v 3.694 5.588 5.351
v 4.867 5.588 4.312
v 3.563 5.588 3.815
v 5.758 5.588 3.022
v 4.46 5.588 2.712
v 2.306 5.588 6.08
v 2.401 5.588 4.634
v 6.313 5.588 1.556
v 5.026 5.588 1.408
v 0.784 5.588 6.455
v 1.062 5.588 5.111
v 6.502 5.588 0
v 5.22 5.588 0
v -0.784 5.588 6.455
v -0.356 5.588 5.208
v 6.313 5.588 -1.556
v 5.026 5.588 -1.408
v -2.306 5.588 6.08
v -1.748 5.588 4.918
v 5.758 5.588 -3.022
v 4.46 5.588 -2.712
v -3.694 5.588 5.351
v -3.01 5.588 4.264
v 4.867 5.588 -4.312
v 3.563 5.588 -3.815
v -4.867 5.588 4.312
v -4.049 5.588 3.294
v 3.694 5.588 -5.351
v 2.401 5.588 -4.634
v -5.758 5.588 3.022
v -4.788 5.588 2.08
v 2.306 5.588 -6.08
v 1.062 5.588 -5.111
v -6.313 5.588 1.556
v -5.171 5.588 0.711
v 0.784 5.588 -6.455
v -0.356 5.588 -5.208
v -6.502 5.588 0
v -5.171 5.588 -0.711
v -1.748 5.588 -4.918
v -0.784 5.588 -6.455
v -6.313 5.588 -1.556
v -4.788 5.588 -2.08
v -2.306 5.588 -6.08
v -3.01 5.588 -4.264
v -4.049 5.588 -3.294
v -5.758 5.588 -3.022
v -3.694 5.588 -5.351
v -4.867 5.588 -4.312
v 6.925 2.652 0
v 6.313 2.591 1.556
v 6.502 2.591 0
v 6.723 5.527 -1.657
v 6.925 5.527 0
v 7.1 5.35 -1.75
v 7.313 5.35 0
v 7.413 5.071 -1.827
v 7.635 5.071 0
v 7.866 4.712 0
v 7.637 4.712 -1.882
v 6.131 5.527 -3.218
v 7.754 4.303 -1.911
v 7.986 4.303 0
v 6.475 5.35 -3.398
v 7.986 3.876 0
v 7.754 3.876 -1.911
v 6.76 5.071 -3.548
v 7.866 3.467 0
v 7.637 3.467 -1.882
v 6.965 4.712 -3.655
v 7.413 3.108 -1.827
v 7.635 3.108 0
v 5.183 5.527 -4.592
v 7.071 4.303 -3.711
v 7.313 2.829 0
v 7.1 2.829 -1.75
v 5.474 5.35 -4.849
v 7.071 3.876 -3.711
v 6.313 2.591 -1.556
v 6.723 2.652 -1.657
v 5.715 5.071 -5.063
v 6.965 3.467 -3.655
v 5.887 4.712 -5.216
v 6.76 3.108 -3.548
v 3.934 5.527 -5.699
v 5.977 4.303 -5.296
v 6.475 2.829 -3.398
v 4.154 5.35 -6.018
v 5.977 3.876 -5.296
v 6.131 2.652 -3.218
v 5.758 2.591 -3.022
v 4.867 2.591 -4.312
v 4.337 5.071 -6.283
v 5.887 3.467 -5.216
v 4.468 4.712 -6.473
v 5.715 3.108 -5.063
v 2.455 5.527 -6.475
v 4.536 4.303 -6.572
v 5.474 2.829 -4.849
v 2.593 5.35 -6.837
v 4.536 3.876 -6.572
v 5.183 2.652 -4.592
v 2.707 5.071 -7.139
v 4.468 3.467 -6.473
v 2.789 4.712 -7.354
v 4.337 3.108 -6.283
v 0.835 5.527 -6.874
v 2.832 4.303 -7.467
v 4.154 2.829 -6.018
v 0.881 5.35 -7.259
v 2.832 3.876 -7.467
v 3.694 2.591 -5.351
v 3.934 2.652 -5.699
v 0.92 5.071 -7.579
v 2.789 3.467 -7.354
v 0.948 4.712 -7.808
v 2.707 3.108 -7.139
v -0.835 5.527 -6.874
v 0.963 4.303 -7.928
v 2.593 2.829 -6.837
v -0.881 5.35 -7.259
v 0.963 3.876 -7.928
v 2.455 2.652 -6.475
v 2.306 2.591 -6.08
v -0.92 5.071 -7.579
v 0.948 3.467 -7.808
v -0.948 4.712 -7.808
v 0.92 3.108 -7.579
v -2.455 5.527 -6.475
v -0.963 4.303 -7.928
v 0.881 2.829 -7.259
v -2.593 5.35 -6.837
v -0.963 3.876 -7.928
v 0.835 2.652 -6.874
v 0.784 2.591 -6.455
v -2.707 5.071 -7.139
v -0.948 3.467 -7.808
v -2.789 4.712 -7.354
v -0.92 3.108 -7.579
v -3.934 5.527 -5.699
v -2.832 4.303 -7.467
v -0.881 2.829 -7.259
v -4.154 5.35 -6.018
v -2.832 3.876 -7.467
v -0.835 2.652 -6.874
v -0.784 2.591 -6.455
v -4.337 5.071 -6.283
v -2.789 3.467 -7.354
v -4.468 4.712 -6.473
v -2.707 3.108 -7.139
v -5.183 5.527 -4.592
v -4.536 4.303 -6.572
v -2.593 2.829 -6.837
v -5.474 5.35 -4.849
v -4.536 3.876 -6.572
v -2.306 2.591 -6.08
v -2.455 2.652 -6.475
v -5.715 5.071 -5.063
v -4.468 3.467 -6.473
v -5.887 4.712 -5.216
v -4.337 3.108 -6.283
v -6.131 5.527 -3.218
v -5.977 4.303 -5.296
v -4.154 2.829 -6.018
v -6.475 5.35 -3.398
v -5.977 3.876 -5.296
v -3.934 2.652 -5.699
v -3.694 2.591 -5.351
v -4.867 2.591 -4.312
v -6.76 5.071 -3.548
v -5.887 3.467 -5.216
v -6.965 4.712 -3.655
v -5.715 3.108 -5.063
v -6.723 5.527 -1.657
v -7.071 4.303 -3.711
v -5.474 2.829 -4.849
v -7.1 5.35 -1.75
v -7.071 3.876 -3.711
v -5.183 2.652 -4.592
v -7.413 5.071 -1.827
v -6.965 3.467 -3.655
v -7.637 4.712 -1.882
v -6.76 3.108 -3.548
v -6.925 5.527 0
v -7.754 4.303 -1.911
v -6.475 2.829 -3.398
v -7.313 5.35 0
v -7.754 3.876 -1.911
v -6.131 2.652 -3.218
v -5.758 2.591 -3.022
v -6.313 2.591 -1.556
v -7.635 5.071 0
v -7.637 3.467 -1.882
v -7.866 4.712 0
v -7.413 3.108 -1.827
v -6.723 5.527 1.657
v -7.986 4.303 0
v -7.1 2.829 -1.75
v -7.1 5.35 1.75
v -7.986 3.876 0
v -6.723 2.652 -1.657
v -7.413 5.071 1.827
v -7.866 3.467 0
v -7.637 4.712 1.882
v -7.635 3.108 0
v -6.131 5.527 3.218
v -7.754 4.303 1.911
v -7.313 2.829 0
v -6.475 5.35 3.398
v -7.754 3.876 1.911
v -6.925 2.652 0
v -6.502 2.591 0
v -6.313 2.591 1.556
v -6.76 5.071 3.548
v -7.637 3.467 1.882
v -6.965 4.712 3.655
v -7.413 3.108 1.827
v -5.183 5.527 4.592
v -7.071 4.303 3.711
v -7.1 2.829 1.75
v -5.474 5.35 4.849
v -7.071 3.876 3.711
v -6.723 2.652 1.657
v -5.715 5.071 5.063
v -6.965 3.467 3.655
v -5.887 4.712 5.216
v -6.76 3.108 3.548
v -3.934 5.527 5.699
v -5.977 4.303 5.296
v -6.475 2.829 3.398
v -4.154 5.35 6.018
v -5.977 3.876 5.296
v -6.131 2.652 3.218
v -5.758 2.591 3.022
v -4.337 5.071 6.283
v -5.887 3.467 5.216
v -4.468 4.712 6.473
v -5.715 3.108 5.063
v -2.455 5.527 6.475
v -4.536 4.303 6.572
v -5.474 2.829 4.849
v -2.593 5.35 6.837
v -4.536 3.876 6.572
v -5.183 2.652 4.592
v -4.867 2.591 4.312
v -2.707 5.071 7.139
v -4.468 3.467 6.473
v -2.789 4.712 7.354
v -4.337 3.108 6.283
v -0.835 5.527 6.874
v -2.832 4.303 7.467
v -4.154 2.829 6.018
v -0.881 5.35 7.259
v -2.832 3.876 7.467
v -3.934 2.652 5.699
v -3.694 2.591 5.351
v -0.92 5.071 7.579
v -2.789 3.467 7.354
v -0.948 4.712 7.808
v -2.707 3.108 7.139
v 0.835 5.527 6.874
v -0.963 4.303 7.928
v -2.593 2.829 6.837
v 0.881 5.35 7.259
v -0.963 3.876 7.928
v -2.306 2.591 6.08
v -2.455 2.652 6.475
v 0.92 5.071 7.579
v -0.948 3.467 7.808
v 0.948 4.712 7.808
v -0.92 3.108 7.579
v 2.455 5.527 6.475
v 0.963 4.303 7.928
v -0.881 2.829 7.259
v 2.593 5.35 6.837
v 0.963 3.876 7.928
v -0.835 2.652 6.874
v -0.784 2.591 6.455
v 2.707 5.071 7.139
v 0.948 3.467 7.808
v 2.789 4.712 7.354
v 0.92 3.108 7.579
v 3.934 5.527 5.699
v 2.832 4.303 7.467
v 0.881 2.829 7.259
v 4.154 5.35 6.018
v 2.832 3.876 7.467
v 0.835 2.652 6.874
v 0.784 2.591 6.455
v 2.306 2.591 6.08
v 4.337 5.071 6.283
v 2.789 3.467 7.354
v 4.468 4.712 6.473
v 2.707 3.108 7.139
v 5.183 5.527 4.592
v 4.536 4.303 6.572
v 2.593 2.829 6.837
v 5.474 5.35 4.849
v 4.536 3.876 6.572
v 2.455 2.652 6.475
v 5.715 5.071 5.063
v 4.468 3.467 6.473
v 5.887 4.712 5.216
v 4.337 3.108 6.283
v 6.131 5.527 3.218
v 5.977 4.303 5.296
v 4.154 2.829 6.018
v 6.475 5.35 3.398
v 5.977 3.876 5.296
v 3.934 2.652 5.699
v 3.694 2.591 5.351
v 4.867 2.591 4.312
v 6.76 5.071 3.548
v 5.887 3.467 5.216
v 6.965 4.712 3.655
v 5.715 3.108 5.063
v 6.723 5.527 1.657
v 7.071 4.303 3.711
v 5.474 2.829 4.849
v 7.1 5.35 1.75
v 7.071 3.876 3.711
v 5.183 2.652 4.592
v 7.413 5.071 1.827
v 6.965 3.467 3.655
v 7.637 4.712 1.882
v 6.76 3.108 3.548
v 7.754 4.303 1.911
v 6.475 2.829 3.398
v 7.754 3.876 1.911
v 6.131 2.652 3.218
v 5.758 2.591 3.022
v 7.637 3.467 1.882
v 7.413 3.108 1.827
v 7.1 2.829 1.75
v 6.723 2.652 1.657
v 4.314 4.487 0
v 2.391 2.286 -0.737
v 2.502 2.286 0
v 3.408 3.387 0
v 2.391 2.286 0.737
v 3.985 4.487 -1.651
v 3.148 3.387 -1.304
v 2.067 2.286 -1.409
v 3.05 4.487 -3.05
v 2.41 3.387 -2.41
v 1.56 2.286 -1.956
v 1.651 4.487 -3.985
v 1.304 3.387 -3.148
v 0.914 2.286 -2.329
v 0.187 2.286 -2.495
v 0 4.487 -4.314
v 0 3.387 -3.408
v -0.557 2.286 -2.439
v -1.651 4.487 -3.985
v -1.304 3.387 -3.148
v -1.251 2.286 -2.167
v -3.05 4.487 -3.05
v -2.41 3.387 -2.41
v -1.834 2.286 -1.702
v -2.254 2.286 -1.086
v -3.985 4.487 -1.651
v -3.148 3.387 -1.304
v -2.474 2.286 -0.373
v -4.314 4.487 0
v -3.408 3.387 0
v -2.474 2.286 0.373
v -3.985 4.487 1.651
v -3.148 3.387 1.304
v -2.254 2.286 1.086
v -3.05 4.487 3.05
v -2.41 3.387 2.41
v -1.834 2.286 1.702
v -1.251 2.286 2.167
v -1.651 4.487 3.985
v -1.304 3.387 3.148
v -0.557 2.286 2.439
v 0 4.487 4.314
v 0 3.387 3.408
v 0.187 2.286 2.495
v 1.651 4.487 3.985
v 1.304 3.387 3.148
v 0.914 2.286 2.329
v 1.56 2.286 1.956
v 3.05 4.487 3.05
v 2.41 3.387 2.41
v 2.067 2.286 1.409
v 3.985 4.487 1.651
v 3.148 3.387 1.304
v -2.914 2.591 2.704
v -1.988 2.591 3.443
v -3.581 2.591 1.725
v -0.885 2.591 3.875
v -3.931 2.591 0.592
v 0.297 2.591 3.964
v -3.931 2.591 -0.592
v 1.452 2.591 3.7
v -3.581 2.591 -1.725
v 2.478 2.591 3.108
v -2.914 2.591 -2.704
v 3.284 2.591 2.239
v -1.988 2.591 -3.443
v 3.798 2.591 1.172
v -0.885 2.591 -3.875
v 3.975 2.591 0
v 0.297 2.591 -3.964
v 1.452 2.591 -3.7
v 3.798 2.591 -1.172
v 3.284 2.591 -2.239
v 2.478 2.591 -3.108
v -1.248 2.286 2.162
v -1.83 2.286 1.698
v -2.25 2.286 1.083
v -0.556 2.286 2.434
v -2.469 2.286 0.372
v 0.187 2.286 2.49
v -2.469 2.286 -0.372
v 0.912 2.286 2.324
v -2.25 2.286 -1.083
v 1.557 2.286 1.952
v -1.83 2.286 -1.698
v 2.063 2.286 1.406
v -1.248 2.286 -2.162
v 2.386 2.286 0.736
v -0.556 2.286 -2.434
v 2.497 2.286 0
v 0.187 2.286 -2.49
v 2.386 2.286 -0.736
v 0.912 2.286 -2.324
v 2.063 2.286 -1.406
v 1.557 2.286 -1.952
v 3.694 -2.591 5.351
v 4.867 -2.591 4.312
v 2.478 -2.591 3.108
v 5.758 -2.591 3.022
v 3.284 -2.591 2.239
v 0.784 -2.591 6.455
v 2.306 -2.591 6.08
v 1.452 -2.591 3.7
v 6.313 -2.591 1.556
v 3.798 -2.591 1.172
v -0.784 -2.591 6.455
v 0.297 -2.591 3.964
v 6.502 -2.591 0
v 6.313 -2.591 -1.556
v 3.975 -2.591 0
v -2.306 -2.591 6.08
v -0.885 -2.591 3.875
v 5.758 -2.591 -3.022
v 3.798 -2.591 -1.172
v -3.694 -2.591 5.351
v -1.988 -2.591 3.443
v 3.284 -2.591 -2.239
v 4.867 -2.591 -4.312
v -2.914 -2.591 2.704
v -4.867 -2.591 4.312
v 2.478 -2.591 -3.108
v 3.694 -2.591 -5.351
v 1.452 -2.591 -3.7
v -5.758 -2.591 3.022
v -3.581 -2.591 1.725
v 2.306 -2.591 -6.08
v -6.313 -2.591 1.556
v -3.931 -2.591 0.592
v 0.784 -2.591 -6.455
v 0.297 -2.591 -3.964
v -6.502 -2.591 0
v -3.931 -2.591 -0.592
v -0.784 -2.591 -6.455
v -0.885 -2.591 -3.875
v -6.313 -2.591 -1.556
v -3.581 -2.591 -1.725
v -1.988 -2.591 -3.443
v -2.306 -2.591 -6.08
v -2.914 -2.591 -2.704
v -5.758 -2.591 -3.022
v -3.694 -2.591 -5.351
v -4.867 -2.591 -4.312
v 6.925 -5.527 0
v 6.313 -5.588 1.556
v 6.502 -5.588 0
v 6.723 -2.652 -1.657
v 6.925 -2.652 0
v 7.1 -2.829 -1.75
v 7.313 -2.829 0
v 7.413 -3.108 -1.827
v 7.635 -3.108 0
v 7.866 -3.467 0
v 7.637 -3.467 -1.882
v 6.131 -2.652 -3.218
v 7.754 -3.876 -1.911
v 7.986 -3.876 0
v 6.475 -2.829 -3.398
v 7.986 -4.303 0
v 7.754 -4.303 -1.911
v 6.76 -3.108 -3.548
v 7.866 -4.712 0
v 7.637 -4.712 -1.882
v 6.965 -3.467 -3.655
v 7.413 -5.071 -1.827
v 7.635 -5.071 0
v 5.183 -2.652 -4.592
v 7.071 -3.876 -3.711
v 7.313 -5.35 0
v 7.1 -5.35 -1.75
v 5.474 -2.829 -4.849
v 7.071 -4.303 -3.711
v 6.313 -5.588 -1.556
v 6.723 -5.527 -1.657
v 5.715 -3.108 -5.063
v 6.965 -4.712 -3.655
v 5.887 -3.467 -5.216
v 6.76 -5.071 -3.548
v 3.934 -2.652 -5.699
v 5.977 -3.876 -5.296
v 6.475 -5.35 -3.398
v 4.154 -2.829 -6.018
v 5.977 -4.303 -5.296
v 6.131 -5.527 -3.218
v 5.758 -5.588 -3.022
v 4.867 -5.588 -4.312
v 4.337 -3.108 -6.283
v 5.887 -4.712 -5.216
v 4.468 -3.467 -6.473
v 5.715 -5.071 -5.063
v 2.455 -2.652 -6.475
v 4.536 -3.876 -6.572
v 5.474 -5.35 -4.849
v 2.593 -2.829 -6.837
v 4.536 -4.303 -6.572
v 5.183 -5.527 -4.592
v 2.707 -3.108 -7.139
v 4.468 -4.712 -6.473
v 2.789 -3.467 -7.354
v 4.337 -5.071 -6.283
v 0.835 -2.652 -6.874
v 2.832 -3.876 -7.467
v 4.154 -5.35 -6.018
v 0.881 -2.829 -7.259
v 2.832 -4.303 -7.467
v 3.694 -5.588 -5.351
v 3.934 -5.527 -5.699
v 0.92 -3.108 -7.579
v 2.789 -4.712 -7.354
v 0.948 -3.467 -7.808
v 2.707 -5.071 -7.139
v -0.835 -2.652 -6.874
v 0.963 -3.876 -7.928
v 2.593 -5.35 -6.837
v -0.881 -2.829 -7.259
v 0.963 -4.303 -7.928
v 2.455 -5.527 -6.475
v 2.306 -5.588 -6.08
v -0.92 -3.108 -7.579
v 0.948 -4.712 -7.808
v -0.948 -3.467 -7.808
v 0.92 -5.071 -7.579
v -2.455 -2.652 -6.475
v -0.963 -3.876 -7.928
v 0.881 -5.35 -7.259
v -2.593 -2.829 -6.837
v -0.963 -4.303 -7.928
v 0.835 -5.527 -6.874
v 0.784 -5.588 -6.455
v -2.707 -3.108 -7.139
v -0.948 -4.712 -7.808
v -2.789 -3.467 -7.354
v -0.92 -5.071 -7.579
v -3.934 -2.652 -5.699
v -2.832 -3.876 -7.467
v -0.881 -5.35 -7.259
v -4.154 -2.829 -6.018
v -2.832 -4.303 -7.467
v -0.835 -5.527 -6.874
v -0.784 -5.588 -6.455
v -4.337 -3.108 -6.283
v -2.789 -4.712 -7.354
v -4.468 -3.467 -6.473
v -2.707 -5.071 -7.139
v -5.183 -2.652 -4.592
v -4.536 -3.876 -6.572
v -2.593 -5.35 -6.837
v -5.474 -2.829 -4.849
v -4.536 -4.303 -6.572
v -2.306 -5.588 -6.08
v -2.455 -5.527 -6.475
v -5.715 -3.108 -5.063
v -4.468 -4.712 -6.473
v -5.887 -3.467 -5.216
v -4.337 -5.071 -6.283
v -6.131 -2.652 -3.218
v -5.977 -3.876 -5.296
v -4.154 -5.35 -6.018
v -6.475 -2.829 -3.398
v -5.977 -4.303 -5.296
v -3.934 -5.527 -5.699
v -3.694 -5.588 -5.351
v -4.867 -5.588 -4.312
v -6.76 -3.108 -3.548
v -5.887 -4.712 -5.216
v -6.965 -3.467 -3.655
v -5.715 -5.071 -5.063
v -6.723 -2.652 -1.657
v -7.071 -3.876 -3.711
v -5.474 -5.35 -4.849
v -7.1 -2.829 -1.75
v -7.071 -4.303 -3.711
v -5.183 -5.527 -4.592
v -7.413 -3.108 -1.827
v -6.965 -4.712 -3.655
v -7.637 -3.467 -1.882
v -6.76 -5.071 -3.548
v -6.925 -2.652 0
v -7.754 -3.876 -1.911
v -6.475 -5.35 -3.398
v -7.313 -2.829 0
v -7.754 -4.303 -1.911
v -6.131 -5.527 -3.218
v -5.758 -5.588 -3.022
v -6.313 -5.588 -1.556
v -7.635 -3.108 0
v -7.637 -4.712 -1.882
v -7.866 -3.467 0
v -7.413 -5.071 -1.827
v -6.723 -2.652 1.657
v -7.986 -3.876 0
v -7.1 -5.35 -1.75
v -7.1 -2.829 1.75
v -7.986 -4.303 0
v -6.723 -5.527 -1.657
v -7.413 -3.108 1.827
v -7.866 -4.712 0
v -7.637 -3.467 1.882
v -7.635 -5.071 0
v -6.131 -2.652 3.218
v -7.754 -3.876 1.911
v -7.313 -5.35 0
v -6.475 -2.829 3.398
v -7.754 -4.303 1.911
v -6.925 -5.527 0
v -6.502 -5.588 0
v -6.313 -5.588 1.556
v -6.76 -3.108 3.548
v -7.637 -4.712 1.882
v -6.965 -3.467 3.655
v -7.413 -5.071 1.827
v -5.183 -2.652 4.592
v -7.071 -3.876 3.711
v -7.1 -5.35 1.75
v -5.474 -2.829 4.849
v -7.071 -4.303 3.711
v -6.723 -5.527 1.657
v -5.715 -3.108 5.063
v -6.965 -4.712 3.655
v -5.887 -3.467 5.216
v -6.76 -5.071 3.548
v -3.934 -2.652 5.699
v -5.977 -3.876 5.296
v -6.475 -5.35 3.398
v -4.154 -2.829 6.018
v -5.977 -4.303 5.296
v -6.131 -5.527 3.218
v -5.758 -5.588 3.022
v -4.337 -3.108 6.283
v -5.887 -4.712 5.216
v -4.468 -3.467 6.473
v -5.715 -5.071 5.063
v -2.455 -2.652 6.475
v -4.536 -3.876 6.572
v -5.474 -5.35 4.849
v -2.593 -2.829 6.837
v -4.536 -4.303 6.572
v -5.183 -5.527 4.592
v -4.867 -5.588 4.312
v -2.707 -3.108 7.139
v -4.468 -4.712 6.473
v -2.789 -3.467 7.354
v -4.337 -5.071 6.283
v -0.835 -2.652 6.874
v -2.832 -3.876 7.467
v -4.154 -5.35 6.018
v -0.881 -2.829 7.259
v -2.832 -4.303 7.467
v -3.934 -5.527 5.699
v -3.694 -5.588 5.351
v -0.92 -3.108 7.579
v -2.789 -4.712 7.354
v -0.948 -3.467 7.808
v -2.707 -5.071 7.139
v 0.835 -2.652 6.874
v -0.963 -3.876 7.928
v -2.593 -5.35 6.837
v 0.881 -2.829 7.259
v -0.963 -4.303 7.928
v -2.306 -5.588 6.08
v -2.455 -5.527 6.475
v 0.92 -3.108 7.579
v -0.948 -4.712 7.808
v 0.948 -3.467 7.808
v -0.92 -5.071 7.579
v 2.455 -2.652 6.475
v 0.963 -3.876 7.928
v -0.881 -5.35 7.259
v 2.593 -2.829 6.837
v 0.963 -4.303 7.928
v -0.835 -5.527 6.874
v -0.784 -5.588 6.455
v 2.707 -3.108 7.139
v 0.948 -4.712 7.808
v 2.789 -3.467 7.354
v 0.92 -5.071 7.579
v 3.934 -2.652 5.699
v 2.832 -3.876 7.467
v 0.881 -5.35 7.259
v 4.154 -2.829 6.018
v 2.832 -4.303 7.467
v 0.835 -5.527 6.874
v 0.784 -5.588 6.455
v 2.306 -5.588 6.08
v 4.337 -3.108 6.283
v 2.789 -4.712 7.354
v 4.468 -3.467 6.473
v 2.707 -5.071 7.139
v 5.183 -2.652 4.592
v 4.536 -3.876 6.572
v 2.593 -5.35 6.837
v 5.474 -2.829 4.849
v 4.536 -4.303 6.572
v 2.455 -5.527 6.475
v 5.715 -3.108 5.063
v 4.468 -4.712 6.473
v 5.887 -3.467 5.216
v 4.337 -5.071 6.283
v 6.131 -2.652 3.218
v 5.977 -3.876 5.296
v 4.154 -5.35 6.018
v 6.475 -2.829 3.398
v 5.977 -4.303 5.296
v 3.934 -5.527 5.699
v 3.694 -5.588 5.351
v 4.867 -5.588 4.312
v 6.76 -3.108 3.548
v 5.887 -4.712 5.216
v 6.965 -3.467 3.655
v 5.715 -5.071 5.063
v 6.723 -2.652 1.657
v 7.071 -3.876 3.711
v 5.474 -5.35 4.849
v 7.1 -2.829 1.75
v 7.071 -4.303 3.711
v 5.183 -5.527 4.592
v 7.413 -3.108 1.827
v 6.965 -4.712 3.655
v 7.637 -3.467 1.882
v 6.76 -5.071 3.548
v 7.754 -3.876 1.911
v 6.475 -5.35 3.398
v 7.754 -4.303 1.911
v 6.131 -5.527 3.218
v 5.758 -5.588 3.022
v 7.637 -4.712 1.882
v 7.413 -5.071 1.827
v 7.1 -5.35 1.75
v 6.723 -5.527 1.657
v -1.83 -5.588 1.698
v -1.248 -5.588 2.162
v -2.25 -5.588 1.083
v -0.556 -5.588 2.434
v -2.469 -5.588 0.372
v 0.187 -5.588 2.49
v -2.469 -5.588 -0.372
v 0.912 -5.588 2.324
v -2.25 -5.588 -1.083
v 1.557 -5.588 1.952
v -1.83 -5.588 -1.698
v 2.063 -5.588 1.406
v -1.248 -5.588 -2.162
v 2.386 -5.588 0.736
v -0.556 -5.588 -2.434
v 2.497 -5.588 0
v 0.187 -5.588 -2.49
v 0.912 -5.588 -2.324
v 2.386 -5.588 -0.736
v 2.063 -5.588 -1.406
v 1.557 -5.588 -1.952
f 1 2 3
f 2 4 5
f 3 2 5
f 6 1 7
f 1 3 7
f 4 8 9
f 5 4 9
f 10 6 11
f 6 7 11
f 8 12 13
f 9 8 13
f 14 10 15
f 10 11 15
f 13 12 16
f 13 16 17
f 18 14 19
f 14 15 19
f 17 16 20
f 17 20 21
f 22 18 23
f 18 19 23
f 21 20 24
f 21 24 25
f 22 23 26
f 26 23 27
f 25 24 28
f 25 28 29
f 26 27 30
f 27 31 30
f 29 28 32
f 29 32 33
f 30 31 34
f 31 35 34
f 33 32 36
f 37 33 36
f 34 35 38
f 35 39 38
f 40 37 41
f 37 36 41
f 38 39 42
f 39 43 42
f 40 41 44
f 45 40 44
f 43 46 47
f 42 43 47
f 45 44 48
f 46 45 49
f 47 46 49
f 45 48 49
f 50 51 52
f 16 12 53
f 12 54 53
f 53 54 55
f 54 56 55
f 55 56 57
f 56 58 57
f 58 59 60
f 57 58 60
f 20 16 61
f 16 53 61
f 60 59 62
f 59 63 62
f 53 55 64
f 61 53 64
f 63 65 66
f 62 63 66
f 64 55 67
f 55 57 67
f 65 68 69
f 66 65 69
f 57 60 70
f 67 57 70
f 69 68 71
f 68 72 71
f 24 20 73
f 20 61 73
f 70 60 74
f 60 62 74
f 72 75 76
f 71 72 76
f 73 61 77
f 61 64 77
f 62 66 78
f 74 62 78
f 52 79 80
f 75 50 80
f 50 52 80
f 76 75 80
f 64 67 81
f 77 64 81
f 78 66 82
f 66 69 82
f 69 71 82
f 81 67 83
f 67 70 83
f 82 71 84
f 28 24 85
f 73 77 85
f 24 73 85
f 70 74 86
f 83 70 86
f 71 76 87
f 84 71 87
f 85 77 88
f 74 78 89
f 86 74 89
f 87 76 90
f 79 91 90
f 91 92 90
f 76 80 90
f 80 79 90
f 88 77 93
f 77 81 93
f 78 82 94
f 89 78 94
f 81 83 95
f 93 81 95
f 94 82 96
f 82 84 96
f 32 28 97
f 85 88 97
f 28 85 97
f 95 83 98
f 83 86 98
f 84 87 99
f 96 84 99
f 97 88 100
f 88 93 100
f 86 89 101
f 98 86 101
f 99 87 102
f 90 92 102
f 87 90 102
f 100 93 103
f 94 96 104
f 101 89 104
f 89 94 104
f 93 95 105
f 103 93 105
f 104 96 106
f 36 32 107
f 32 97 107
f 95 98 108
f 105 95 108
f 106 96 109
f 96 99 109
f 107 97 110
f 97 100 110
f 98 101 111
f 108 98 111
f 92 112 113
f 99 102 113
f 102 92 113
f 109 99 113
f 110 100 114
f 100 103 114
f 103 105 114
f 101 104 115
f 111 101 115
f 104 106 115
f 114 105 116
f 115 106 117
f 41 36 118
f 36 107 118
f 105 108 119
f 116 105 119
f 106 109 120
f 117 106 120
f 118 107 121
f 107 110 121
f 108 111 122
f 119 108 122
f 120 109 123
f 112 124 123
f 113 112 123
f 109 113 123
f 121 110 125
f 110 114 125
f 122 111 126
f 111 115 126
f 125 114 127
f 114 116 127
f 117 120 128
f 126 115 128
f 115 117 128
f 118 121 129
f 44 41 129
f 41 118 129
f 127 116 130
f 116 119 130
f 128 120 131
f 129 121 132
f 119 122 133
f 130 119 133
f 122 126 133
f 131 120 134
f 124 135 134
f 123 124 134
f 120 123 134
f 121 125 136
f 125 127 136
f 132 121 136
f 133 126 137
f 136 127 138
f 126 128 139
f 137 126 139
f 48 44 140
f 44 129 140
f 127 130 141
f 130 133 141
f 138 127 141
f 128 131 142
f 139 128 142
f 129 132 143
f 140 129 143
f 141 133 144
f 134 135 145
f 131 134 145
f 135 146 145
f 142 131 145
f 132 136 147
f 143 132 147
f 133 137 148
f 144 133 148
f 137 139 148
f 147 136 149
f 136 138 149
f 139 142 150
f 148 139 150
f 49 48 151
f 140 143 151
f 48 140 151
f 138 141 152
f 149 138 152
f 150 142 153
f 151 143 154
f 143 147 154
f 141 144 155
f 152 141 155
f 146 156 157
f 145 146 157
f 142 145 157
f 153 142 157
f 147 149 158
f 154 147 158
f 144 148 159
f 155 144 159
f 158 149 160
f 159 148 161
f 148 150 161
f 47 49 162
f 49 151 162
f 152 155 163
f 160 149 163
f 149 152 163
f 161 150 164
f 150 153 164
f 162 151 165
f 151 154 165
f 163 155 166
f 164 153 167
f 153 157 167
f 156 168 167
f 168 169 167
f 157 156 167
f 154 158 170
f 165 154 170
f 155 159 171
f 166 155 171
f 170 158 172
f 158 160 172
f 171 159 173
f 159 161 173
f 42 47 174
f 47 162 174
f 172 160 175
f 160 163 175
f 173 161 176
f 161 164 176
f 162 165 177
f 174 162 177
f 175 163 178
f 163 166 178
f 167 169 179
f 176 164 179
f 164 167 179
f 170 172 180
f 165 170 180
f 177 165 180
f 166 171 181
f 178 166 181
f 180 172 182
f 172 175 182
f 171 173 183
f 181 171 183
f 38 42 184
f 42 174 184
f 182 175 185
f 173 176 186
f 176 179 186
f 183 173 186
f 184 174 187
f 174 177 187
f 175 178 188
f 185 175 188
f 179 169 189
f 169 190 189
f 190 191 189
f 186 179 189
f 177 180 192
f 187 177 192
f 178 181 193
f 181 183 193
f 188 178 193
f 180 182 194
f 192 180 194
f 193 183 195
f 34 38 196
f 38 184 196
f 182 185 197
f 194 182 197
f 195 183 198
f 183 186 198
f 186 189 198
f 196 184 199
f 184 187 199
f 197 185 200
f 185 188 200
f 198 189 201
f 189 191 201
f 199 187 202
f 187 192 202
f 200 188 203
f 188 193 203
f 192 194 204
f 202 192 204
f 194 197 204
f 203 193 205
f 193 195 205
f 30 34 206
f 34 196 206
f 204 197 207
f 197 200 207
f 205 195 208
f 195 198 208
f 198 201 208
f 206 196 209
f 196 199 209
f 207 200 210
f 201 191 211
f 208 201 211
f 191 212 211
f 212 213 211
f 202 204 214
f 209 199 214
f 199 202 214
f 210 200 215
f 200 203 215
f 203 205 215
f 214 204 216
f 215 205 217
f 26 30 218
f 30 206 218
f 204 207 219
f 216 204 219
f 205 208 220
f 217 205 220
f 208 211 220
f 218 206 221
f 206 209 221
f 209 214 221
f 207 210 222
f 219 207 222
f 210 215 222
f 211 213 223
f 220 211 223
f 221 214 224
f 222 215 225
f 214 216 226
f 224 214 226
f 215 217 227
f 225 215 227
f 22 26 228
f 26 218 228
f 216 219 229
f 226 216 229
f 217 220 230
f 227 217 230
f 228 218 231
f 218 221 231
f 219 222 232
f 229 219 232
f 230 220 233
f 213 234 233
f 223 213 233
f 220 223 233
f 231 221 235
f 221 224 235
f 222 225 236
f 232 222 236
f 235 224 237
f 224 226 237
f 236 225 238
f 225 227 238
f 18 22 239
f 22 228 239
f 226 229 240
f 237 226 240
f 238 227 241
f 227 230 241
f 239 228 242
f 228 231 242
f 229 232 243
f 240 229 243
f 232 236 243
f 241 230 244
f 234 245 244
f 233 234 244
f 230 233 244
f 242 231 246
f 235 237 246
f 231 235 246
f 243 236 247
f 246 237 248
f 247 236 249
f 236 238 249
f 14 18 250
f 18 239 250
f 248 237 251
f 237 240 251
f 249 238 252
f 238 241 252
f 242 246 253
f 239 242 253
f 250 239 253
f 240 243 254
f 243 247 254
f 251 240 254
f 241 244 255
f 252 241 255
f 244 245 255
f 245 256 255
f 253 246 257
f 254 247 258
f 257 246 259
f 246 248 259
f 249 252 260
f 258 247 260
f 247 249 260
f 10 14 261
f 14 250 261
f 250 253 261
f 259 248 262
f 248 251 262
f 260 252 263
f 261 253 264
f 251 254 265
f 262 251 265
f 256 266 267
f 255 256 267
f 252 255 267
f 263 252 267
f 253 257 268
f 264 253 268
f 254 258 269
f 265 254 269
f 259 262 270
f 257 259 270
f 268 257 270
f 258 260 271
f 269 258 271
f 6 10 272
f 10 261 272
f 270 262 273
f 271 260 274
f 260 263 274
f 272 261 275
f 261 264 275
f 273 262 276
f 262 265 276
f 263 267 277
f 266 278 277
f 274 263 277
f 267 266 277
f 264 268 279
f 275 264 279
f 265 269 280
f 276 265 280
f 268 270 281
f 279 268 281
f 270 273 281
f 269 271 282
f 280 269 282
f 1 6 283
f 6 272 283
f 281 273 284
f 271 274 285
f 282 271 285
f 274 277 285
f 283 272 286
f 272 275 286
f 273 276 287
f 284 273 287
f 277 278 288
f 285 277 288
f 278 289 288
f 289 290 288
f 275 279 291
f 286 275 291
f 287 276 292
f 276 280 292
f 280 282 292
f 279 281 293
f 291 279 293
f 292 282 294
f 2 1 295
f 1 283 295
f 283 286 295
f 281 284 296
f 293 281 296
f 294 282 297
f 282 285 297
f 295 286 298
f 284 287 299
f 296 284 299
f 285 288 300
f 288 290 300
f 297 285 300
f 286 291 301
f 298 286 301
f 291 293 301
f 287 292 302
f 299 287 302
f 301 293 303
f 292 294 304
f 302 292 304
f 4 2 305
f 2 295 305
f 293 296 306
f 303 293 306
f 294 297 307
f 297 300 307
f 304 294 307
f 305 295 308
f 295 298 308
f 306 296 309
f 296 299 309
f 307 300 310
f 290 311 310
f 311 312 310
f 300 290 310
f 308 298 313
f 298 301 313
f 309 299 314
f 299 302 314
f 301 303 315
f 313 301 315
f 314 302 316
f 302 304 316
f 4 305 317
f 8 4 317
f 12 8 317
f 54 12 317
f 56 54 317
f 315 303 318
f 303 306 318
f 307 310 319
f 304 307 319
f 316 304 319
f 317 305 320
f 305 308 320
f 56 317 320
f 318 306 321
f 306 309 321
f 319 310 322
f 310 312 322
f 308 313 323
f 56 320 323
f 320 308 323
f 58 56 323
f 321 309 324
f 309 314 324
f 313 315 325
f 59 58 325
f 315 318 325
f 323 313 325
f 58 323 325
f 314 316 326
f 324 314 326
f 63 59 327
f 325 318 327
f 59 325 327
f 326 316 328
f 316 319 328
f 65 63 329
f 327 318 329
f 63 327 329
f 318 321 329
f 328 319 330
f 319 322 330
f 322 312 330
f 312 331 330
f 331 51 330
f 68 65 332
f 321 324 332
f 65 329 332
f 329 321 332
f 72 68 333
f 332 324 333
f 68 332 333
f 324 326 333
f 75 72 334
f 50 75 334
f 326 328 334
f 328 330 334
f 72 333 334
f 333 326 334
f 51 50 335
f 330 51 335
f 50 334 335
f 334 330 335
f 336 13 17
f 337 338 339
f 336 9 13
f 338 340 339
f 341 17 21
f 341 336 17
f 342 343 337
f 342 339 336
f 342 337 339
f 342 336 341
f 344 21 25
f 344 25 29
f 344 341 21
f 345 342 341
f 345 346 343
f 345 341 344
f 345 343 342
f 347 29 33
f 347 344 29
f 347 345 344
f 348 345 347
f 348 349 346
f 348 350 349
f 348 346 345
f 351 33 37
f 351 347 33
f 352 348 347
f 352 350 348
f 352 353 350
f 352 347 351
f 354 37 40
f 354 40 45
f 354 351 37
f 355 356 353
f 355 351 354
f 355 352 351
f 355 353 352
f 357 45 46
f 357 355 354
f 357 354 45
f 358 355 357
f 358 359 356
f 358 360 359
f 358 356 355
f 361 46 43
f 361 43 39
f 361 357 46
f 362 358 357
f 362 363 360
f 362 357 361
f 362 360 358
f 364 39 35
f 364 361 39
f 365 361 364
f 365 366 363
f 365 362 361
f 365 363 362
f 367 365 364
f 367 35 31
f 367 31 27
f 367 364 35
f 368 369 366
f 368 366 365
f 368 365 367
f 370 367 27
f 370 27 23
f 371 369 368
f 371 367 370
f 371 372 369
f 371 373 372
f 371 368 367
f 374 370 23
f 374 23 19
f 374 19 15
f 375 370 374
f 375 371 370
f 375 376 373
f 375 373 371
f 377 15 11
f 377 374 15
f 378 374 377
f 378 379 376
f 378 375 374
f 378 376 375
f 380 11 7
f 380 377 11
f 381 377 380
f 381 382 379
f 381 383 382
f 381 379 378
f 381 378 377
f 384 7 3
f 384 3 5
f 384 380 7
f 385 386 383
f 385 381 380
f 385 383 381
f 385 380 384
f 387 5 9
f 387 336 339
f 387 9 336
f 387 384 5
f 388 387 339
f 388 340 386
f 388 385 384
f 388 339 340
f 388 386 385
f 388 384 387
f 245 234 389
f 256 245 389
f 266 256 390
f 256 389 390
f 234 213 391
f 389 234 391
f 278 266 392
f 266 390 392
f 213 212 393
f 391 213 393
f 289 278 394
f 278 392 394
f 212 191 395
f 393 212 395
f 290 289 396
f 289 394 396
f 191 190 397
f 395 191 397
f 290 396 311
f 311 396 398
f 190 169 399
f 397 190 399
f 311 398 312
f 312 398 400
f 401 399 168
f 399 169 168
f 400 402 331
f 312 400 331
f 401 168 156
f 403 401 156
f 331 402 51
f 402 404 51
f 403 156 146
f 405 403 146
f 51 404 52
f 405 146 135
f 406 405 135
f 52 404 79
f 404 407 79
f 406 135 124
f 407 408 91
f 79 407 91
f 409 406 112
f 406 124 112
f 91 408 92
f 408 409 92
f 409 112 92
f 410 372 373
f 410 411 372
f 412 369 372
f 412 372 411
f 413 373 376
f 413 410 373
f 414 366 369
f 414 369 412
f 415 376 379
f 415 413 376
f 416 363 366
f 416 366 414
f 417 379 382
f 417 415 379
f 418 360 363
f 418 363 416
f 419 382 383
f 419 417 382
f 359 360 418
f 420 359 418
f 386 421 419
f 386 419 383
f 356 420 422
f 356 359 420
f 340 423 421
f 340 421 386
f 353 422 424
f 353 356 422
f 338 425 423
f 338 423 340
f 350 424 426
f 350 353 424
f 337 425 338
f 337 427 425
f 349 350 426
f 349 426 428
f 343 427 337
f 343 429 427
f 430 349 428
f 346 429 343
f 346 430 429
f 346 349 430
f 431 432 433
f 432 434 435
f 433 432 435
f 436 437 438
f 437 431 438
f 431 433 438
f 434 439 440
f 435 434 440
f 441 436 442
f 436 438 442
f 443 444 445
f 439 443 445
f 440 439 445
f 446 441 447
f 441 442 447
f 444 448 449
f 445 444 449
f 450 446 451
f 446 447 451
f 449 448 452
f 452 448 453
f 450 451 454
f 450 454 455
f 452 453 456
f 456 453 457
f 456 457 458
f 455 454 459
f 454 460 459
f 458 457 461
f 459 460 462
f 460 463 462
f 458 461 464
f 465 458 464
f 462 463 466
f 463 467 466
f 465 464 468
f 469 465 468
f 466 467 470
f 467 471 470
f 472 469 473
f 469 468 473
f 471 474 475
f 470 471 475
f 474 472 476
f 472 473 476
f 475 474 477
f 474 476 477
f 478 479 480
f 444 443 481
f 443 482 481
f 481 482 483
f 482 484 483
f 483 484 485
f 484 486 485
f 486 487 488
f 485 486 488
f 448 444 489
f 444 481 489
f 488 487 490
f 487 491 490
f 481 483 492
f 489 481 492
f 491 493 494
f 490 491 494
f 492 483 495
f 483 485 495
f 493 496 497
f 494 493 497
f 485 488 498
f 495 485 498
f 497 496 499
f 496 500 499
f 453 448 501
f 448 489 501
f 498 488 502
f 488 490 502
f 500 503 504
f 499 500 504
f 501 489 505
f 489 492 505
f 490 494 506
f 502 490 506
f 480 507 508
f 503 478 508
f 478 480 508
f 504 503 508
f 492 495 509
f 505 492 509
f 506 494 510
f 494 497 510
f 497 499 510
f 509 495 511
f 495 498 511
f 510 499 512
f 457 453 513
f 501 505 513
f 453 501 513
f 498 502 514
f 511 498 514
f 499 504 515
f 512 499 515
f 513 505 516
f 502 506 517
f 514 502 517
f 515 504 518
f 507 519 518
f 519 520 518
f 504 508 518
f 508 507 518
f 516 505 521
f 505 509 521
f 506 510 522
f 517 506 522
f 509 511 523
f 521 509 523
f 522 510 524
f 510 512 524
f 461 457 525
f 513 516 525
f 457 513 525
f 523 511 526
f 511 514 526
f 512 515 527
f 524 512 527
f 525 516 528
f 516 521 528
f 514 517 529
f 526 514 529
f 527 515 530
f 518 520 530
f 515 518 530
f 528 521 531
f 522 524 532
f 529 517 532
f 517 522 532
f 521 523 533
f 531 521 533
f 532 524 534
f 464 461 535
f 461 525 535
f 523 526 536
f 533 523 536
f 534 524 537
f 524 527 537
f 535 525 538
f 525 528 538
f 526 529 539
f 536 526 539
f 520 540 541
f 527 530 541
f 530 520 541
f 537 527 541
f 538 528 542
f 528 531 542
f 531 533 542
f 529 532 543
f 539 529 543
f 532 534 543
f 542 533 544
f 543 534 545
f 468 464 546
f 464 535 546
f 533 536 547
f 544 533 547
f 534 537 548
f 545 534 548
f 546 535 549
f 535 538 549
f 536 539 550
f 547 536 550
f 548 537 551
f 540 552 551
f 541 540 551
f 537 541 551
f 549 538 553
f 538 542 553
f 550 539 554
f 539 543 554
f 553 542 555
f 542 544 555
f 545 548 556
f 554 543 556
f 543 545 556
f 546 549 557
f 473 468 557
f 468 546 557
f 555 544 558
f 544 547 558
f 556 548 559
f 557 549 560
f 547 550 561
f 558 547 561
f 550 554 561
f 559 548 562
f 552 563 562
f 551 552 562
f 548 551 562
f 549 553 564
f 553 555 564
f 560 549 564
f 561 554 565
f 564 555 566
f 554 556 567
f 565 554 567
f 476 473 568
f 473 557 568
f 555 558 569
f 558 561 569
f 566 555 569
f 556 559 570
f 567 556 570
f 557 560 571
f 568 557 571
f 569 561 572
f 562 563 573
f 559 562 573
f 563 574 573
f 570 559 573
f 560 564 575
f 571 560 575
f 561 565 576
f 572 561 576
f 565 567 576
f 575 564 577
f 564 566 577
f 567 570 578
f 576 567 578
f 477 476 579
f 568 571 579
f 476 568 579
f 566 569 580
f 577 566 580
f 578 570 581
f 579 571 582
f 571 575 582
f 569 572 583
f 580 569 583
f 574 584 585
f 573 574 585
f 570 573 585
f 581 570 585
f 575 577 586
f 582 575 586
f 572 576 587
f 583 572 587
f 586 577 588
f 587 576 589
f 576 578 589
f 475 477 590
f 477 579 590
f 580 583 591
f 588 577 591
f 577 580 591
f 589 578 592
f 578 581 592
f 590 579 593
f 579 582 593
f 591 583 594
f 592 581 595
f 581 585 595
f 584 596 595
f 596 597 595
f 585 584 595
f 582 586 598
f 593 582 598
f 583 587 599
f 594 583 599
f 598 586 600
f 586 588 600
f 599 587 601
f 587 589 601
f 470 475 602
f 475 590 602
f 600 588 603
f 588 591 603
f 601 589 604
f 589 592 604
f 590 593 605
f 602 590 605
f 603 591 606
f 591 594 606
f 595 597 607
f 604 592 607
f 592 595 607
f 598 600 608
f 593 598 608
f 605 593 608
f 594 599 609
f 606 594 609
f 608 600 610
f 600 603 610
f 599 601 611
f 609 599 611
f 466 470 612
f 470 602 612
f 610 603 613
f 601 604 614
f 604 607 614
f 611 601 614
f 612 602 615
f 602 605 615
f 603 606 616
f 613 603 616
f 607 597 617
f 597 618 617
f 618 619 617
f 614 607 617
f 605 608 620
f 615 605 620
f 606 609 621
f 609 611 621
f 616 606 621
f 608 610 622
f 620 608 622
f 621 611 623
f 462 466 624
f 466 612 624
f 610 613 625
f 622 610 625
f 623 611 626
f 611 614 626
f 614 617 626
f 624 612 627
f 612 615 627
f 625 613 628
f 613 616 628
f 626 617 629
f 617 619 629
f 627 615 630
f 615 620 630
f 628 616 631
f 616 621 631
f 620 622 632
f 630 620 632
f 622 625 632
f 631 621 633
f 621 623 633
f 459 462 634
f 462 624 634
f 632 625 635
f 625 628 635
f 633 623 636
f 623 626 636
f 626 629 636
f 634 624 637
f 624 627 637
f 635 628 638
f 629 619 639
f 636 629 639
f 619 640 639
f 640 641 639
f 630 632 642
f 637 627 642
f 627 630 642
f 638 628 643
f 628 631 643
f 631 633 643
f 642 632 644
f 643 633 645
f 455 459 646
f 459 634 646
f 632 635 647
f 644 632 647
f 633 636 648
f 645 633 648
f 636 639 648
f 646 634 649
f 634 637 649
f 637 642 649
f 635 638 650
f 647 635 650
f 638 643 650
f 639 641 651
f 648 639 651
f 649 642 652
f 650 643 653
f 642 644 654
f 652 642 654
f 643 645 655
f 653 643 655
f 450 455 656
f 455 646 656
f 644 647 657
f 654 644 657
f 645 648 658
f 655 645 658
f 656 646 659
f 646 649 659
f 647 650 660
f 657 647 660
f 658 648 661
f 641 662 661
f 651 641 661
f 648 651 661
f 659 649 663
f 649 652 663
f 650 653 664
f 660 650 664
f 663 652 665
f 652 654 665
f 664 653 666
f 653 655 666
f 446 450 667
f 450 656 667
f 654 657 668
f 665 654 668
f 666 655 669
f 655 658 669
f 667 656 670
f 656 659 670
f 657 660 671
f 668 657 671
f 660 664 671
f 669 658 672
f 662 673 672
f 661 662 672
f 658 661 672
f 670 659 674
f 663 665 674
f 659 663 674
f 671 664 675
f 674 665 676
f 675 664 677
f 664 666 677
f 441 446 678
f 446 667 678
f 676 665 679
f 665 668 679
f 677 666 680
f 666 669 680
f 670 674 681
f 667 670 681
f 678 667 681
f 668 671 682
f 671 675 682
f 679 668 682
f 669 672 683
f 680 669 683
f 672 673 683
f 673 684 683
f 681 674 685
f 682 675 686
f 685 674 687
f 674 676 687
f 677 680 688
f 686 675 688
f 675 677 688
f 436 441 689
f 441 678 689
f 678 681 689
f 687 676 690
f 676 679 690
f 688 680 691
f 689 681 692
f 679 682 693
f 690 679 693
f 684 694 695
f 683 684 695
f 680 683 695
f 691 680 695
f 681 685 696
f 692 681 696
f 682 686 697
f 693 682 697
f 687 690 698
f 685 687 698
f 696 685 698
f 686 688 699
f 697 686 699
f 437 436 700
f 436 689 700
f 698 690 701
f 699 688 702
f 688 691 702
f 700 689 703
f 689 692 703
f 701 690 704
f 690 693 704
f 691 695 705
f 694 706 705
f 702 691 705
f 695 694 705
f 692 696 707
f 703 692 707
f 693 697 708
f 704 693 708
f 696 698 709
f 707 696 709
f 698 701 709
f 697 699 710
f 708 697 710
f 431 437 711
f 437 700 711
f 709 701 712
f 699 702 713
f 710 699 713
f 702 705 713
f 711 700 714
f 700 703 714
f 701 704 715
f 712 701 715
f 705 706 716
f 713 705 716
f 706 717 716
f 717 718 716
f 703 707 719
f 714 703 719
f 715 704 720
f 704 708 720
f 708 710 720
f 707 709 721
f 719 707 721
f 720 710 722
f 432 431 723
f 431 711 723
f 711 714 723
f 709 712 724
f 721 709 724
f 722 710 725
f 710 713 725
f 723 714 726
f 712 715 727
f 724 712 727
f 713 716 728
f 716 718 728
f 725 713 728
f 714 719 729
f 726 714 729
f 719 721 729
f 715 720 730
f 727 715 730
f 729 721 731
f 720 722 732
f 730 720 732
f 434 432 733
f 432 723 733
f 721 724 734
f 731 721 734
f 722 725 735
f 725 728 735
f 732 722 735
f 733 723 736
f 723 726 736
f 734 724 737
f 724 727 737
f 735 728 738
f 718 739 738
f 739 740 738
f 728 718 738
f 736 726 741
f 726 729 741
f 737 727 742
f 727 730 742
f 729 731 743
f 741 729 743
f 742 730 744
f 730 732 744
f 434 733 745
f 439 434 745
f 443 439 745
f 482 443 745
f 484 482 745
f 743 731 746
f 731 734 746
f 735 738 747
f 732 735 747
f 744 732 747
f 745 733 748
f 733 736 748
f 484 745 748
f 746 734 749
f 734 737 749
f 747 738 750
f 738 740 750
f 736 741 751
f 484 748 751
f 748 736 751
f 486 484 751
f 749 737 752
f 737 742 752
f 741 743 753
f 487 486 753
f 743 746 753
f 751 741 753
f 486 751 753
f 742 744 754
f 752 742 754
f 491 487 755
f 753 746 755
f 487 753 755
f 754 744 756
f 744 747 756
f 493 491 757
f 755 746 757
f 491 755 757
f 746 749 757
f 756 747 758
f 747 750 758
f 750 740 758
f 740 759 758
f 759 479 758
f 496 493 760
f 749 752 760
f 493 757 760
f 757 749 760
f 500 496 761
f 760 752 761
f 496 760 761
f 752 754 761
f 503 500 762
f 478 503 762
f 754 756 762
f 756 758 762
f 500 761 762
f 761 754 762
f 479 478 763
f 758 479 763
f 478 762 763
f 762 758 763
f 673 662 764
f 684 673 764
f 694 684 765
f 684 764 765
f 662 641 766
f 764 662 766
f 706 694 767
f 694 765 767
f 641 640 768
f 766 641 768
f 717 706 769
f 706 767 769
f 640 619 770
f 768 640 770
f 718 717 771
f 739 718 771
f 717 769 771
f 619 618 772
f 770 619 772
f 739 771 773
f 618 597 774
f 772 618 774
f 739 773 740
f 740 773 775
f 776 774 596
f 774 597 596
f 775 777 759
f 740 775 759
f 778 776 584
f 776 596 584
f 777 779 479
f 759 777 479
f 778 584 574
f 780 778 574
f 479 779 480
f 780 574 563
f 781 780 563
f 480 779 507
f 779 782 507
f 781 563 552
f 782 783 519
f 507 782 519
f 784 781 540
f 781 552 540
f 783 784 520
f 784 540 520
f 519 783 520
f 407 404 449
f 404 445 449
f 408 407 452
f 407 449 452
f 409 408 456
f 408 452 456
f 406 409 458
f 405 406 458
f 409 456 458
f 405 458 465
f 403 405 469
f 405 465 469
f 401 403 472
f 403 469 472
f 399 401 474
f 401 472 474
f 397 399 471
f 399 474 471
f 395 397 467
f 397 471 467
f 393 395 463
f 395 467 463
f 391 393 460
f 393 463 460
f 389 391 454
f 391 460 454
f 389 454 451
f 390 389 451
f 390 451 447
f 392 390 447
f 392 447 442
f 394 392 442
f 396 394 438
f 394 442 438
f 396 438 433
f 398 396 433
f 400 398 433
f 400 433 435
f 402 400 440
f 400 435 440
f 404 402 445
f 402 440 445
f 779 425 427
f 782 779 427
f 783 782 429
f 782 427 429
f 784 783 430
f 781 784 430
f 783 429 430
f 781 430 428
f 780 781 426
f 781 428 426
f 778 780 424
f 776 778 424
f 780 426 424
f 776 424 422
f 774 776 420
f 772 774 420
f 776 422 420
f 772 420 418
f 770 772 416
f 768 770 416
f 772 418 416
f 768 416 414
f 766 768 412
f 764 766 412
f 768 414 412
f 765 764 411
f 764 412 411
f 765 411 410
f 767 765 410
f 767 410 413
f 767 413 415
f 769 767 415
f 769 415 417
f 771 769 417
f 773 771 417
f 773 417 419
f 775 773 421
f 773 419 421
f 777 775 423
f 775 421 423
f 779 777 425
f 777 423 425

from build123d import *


with BuildPart() as part:
    # Sketch2 → Revolve1 (revolve)
    with BuildSketch(Plane.XY):
        with BuildLine():
            Line((2.4967819, -5.588), (2.4967819, 5.588))
            Line((2.4967819, 5.588), (6.5024, 5.588))
            ThreePointArc((6.5024, 5.588), (8.001, 4.0894), (6.5024, 2.5908))
            Line((6.5024, 2.5908), (3.9751, 2.5908))
            Line((3.9751, 2.5908), (3.9751, -2.5908))
            Line((3.9751, -2.5908), (6.5024, -2.5908))
            ThreePointArc((6.5024, -2.5908), (8.001, -4.0894), (6.5024, -5.588))
            Line((6.5024, -5.588), (2.4967819, -5.588))
        make_face()
    revolve(axis=Axis((0, 0, 0), (0, 1, 0)))

    # Sketch3 → Cut-Revolve1 (revolve, cut)
    with BuildSketch(Plane.XY):
        Polygon((0, 5.588), (5.2197, 5.588), (2.5019, 2.286), (0, 2.286), align=None)
    revolve(axis=Axis((0, 2.286, 0), (0, 1, 0)), mode=Mode.SUBTRACT)


solid = part.part
